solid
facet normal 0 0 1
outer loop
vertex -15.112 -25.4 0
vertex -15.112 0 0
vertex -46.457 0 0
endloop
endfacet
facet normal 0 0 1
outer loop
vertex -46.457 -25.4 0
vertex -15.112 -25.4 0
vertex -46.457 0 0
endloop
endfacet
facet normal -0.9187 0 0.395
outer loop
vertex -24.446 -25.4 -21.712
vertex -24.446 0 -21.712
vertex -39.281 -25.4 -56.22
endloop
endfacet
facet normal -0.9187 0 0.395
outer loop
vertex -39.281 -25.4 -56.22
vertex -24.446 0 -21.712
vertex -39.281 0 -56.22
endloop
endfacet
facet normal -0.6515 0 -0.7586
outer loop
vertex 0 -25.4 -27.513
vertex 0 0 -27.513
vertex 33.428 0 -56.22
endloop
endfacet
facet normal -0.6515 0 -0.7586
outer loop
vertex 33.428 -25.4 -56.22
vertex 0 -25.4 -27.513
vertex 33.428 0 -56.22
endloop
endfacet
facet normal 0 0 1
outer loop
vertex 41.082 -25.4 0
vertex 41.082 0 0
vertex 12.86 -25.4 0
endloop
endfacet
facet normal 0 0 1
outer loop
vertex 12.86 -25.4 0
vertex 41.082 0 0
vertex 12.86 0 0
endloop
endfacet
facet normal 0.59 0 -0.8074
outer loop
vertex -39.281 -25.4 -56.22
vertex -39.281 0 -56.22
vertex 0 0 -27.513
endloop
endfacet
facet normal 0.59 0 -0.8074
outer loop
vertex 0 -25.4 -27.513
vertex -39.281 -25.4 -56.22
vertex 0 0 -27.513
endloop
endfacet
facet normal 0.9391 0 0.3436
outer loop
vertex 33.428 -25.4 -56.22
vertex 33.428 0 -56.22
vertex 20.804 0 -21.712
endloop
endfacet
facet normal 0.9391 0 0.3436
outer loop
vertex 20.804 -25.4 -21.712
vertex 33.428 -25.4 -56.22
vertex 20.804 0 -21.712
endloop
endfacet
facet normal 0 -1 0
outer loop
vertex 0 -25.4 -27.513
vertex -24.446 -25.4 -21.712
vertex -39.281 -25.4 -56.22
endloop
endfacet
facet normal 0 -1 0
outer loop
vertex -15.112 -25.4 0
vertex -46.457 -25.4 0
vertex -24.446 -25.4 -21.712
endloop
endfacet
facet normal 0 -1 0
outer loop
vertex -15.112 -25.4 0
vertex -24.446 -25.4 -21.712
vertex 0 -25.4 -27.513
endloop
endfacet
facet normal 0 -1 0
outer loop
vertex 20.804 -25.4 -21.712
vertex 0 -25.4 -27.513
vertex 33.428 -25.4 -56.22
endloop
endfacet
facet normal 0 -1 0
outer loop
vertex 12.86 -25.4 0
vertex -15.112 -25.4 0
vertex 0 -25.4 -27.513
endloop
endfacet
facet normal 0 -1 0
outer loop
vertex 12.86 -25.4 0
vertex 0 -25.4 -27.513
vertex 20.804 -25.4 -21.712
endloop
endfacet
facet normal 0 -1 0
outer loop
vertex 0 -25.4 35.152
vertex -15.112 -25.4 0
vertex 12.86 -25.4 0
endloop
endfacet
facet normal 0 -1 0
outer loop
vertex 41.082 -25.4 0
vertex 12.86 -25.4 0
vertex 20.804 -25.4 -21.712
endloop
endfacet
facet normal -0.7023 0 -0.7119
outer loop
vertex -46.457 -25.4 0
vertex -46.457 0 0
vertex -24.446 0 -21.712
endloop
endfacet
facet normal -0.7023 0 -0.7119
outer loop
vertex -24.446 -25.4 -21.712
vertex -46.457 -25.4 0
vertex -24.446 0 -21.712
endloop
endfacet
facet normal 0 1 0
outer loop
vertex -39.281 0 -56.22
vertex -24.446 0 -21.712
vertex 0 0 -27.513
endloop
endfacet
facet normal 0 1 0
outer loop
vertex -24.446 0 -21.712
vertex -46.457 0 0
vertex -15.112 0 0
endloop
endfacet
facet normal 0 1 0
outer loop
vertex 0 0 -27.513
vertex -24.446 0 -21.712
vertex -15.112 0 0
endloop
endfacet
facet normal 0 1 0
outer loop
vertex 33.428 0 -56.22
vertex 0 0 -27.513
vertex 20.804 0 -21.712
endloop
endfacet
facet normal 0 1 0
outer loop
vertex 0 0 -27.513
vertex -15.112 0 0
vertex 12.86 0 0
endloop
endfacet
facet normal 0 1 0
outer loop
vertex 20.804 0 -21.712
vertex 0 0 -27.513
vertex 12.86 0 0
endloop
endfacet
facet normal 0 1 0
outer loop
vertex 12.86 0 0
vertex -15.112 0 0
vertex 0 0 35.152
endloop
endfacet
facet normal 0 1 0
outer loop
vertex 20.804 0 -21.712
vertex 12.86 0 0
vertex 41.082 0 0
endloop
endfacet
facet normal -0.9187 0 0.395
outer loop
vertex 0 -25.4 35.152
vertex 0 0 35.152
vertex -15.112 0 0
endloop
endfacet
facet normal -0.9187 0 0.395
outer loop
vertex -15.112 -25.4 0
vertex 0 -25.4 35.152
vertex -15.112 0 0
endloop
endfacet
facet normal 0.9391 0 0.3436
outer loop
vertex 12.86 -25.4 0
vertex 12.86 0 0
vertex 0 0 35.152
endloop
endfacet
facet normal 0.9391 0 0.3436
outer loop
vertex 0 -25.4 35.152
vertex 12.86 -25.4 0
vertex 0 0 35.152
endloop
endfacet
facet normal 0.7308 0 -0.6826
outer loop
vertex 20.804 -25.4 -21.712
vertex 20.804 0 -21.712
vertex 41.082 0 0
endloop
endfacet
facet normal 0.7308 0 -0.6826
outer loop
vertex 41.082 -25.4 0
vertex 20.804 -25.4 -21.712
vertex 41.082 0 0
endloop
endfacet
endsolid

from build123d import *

# Parameters (mm, degrees)
F1_DEPTH = 25.4


with BuildPart() as f1:
    # F0 (on Front) → F1 (new body)
    with BuildSketch(Plane.XZ):
        Polygon((12.860392, 0), (0, 35.152197), (-15.112189, 0), (-24.446175, -21.711619), (-39.281469, -56.219734), (0, -27.512548), (33.428319, -56.219734), (20.803563, -21.711619), align=None)
        Polygon((41.081976, 0), (12.860392, 0), (20.803563, -21.711619), align=None)
        Polygon((-24.446175, -21.711619), (-15.112189, 0), (-46.456773, 0), align=None)
    extrude(amount=F1_DEPTH)


solid = f1.part
